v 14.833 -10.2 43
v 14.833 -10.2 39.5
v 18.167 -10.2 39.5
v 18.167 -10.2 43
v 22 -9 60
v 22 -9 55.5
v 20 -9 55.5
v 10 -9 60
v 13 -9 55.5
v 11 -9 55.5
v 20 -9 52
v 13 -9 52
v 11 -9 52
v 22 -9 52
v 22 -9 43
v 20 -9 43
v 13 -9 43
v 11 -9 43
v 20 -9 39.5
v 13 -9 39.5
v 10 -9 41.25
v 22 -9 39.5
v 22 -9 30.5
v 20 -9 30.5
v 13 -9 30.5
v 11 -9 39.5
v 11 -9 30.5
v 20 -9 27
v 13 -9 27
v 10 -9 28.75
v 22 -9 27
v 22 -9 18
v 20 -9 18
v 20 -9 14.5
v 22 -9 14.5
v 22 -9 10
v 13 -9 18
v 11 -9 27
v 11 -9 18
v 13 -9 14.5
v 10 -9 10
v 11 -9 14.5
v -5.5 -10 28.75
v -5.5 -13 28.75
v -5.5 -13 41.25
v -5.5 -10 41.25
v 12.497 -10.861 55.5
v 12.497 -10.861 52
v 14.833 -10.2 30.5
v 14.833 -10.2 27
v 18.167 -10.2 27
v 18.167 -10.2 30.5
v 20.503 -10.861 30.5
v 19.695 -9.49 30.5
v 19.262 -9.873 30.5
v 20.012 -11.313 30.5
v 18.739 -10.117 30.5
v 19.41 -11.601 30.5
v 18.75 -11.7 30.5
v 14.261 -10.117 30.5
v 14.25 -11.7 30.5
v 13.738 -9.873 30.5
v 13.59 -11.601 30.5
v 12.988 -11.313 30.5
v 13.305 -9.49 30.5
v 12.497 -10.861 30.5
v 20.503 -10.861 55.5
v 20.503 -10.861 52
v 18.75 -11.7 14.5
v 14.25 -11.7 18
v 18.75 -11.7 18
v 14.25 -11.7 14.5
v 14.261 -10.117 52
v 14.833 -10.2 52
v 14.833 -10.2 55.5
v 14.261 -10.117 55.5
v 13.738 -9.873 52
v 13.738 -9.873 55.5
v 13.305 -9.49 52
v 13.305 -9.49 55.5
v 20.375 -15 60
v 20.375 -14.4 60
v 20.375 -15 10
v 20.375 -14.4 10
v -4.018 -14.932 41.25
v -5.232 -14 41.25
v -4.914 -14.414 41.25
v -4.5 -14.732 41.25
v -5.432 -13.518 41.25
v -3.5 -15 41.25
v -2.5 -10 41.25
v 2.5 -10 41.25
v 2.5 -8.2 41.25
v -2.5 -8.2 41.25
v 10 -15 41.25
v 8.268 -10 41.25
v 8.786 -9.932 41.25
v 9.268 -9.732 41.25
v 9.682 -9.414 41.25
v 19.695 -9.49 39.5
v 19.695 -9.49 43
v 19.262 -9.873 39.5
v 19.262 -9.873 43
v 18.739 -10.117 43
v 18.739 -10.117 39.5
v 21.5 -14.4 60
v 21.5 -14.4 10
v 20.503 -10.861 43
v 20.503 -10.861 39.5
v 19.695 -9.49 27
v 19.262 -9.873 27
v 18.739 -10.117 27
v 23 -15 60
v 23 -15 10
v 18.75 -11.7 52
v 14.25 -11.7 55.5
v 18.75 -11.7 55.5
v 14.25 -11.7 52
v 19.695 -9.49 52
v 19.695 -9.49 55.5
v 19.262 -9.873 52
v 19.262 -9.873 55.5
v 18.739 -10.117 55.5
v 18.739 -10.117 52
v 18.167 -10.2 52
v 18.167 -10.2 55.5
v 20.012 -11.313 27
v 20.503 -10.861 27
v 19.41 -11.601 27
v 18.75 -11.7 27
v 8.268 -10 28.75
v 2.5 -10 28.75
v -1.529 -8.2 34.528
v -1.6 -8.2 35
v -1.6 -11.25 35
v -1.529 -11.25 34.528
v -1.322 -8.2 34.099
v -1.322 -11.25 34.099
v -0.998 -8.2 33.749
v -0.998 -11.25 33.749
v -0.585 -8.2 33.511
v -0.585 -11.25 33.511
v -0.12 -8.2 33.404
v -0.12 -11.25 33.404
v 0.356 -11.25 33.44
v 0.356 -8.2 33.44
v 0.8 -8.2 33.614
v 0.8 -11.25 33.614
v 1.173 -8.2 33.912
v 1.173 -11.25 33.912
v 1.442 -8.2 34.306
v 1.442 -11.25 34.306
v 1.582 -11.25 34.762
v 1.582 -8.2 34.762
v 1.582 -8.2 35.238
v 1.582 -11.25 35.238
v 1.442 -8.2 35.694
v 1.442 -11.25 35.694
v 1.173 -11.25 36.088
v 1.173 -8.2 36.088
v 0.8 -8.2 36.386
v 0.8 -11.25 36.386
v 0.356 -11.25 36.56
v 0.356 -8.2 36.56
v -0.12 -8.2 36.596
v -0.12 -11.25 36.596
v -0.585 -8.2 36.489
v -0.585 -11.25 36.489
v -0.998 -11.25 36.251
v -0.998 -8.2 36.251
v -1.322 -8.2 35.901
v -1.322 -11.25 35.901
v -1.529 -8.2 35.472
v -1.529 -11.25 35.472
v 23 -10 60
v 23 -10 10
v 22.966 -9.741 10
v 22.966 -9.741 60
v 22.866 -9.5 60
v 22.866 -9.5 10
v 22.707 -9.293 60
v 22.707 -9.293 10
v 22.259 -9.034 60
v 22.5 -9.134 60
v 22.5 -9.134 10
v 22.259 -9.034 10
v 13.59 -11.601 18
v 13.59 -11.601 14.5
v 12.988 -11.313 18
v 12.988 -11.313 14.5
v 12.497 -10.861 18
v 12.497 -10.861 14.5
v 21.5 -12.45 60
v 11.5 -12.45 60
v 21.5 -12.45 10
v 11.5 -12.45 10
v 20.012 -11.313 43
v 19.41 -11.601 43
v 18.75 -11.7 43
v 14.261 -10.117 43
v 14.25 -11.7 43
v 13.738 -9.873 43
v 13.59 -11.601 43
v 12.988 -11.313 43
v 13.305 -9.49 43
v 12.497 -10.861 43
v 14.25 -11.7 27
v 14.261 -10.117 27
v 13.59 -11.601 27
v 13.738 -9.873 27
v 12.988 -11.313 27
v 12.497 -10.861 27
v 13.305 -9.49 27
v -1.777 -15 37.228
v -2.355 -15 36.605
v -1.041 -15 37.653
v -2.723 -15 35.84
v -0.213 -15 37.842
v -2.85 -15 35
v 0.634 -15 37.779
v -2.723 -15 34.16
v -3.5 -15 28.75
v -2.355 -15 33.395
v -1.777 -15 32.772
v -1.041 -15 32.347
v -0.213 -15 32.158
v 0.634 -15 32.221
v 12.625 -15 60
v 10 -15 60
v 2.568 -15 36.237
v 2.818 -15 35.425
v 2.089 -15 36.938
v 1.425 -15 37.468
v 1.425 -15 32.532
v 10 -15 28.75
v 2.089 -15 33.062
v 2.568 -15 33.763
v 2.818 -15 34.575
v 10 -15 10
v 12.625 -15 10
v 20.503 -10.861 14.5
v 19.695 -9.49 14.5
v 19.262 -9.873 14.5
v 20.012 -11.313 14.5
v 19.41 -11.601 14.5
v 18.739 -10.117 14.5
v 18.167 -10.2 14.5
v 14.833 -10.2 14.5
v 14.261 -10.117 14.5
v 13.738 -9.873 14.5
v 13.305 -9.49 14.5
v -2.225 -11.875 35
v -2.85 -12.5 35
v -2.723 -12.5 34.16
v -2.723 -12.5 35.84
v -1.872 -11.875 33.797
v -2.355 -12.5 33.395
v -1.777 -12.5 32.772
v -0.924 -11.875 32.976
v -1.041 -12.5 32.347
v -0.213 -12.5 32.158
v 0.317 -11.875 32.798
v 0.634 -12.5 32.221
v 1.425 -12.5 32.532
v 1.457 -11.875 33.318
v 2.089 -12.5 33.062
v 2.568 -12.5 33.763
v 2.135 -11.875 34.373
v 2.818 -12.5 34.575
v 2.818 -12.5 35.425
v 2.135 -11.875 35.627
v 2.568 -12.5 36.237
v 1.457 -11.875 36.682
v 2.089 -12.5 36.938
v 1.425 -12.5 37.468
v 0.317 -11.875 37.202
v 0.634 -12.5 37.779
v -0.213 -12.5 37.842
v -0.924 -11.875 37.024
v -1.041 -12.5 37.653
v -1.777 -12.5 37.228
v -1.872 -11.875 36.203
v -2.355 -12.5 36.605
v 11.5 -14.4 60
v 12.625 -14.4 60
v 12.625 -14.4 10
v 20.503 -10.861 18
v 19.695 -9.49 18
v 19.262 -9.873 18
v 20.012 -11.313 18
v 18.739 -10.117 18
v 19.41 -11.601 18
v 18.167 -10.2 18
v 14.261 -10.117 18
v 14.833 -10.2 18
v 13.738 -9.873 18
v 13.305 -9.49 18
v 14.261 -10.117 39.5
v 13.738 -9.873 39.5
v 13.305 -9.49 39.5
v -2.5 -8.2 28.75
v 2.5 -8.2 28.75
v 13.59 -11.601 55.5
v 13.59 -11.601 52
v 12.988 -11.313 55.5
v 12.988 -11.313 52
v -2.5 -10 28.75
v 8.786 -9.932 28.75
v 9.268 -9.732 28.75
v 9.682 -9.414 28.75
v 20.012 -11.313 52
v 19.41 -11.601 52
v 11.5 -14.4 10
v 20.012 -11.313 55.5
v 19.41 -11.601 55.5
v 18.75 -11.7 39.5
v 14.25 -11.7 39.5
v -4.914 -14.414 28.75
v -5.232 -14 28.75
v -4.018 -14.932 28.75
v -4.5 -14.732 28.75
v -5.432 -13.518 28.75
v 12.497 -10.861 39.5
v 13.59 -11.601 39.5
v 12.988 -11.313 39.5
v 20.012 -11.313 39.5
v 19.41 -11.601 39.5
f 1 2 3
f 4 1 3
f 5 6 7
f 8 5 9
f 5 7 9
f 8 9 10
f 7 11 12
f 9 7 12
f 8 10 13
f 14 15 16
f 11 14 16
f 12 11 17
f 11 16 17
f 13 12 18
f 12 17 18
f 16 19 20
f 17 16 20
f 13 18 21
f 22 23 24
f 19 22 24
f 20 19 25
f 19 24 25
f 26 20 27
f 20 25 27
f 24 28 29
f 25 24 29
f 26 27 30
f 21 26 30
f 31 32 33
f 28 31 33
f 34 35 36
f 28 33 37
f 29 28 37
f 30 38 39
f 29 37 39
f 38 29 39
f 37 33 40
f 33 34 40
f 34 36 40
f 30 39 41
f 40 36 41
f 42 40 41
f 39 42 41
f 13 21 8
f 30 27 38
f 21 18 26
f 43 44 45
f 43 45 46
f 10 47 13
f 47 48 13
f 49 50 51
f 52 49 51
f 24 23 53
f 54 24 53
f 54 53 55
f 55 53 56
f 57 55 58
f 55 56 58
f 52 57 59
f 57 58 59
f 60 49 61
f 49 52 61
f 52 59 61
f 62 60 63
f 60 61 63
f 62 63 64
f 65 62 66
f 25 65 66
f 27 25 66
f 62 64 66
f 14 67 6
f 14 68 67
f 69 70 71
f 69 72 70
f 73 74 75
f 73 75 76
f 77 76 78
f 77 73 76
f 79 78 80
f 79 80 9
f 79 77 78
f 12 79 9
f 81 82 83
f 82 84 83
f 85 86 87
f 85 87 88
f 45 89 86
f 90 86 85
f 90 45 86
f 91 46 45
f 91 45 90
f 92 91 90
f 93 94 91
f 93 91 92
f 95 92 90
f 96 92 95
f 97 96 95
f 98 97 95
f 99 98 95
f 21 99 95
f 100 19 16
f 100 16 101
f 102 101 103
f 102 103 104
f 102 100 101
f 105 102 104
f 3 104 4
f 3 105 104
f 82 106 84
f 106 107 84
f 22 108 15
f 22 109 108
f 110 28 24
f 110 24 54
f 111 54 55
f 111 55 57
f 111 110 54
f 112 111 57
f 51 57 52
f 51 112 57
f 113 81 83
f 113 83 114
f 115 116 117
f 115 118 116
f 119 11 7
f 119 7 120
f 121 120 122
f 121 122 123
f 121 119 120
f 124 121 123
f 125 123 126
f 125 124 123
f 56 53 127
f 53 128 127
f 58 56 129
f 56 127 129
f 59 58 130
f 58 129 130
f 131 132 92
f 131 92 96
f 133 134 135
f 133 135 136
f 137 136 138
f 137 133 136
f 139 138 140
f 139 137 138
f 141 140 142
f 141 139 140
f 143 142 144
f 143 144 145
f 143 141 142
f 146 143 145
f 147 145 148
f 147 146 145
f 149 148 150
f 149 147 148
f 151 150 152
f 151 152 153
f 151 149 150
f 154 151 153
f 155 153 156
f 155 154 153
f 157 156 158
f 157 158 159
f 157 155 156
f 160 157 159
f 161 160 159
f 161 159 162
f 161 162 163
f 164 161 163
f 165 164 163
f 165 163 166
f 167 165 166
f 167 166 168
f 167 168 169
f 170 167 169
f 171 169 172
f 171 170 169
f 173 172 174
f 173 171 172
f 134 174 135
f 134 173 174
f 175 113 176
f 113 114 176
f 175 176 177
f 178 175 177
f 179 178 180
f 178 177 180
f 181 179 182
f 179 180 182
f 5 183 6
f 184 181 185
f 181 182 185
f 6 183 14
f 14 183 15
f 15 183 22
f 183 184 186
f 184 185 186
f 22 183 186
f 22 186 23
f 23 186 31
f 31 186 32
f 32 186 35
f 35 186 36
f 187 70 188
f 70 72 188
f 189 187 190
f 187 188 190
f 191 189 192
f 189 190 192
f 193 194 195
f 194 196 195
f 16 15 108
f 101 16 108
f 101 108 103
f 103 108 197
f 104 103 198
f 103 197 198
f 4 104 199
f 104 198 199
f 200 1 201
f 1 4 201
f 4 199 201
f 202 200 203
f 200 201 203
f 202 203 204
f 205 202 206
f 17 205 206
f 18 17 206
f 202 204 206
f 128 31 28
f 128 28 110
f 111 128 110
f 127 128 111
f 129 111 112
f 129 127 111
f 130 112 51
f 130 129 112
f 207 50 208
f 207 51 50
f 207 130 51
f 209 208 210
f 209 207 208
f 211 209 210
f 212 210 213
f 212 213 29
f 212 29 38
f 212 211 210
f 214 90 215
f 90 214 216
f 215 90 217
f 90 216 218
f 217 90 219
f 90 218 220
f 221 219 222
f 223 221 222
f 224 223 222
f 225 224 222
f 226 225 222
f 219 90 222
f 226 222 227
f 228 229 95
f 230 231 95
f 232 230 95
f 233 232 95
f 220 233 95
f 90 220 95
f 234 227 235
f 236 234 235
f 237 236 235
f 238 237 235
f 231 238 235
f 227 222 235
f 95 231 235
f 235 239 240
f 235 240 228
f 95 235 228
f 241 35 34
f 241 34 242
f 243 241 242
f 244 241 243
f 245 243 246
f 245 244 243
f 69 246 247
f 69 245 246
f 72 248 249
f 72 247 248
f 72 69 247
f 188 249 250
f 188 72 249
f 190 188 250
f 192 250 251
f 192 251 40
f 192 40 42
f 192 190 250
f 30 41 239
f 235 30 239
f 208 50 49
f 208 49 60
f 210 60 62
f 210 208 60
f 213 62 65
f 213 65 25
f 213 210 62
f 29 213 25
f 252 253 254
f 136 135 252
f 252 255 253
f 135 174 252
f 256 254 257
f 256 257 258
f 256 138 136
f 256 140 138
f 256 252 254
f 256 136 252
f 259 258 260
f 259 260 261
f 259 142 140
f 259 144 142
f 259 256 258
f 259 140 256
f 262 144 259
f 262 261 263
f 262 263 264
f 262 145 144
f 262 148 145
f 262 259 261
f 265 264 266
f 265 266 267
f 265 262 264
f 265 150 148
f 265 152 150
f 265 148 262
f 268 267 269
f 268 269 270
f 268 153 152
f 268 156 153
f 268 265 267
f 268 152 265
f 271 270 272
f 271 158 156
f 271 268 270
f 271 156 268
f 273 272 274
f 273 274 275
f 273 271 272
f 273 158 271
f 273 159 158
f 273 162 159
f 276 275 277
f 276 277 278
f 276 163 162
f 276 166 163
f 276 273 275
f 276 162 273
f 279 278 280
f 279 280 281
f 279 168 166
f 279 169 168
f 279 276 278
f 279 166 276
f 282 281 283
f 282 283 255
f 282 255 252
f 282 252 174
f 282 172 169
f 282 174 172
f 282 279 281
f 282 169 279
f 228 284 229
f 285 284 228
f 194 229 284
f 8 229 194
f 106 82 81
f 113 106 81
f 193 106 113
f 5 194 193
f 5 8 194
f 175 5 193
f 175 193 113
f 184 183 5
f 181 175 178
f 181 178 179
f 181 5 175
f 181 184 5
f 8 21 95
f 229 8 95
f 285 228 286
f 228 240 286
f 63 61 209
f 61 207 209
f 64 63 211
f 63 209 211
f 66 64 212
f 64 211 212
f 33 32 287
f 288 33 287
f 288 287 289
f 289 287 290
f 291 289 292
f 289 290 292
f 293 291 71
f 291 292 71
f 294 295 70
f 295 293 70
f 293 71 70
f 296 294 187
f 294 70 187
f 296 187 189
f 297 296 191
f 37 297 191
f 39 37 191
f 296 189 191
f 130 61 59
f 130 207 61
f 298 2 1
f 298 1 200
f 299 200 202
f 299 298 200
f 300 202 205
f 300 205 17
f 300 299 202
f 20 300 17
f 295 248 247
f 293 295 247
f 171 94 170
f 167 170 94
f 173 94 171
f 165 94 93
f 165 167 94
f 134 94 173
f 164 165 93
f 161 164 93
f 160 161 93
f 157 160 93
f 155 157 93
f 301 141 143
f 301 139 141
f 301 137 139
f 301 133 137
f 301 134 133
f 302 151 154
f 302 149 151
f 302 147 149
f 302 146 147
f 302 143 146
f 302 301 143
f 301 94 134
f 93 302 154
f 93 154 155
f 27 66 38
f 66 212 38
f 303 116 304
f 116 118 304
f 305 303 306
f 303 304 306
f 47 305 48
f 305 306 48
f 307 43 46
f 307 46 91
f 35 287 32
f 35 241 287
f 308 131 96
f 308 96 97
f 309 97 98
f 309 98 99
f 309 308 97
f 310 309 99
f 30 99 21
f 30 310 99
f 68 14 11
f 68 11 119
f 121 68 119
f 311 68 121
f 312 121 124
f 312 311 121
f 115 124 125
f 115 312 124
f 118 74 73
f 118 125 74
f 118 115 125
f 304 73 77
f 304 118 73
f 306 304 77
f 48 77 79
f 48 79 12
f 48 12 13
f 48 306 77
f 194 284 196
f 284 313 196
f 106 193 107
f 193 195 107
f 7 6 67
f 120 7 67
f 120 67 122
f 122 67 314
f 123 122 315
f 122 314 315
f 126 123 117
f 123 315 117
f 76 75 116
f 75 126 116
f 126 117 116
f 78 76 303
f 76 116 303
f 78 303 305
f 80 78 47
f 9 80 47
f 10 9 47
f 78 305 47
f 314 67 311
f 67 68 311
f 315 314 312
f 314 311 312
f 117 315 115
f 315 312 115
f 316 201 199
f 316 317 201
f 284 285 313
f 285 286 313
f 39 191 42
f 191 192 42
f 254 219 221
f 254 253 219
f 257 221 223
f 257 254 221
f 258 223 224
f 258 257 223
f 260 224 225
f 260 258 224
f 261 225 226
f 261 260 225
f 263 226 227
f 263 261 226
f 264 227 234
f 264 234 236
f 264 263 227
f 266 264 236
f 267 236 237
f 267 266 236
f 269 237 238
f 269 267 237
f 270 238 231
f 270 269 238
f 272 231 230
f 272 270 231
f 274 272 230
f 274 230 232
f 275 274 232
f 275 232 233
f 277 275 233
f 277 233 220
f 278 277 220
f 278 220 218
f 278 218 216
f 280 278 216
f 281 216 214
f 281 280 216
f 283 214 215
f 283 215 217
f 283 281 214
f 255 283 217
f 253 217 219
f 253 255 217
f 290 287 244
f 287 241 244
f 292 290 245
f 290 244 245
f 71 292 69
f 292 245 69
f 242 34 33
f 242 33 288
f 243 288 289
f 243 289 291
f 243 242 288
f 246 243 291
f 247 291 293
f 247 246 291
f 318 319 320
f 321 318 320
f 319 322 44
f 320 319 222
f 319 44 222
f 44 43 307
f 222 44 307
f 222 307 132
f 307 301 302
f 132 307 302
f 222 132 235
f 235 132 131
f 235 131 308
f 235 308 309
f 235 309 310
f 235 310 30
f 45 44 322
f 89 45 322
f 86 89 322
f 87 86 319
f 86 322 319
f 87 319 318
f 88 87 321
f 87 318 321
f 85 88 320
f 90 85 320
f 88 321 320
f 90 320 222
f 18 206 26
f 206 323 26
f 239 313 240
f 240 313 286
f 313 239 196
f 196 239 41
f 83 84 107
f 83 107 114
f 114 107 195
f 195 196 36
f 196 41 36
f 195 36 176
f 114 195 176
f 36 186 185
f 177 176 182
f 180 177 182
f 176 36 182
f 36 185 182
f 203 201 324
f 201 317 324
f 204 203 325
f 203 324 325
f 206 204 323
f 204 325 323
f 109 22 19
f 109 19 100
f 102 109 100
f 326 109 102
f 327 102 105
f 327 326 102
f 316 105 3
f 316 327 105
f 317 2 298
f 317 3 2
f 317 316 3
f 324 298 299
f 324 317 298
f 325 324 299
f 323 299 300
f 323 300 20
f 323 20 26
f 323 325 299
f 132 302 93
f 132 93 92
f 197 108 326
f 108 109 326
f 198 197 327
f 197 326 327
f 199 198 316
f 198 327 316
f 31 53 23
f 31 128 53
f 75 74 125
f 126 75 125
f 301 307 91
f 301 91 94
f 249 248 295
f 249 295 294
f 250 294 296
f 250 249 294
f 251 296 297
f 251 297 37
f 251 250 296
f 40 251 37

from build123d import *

# Parameters (mm, degrees)
PAD009_DEPTH    = 12.5
POCKET001_DEPTH = 1.75
PAD013_DEPTH    = 12.5


with BuildPart() as f_12_5mm_segment:
    # Sketch015 → Pad009 (new body)
    with BuildSketch(Plane.XY):
        with BuildLine():
            Line((10, -9), (10, -15))
            Line((10, -15), (12.625, -15))
            Line((12.625, -15), (12.625, -14.4))
            Line((12.625, -14.4), (11.5, -14.4))
            Line((11.5, -14.4), (11.5, -12.45))
            Line((11.5, -12.45), (21.5, -12.45))
            Line((21.5, -12.45), (21.5, -14.4))
            Line((21.5, -14.4), (20.375, -14.4))
            Line((20.375, -14.4), (20.375, -15))
            Line((20.375, -15), (23, -15))
            Line((23, -15), (23, -10))
            ThreePointArc((23, -10), (22.707107, -9.292893), (22, -9))
            Line((22, -9), (10, -9))
        make_face()
    extrude(amount=PAD009_DEPTH)

    # Sketch016 → Pocket001 (cut, symmetric)
    with BuildSketch(Plane(origin=(0, 0, 6.25), x_dir=(1, 0, 0), z_dir=(0, 0, -1))):
        with BuildLine():
            ThreePointArc((14.83303, 10.2), (13.737585, 9.87332), (13, 9))
            Line((11, 9), (13, 9))
            Line((12.497007, 10.860502), (11, 9))
            ThreePointArc((14.25, 11.7), (13.27818, 11.479302), (12.497007, 10.860502))
            Line((14.25, 11.7), (18.75, 11.7))
            ThreePointArc((20.502993, 10.860502), (19.72182, 11.479302), (18.75, 11.7))
            Line((20.502993, 10.860502), (22, 9))
            Line((22, 9), (20, 9))
            ThreePointArc((20, 9), (19.262415, 9.87332), (18.16697, 10.2))
            Line((14.83303, 10.2), (18.16697, 10.2))
        make_face()
    extrude(amount=POCKET001_DEPTH, both=True, mode=Mode.SUBTRACT)


with BuildPart() as sf_seg1:
    # Body019 base: copy of 12.5mm-Segment
    add(f_12_5mm_segment.part)


with BuildPart() as sf_seg2:
    # Body022 base: copy of SF-Seg1
    add(sf_seg1.part)


with BuildPart() as sf_seg2_1:
    # Body022 placement: moved
    add(sf_seg2.part.moved(Location((0, 0, 12.5))))


with BuildPart() as sf_seg3:
    # Body012004 base: copy of 12.5mm-Segment
    add(f_12_5mm_segment.part)


with BuildPart() as sf_seg3_1:
    # Body012004 placement: moved
    add(sf_seg3.part.moved(Location((0, 0, 25))))


with BuildPart() as sf_seg4:
    # Body012005 base: copy of 12.5mm-Segment
    add(f_12_5mm_segment.part)


with BuildPart() as sf_seg4_1:
    # Body012005 placement: moved
    add(sf_seg4.part.moved(Location((0, 0, 37.5))))


with BuildPart() as f_50mm_screwfix:
    # Sketch027 → Pad013 (new body)
    with BuildSketch(Plane.XY):
        with BuildLine():
            Line((-3.5, -15), (10, -15))
            Line((10, -9), (10, -15))
            ThreePointArc((8.267949, -10), (9.267949, -9.732051), (10, -9))
            Line((2.5, -10), (8.267949, -10))
            Line((2.5, -8.2), (2.5, -10))
            Line((-2.5, -8.2), (2.5, -8.2))
            Line((-2.5, -10), (-2.5, -8.2))
            Line((-5.5, -10), (-2.5, -10))
            Line((-5.5, -13), (-5.5, -10))
            ThreePointArc((-5.5, -13), (-4.914214, -14.414214), (-3.5, -15))
        make_face()
    extrude(amount=PAD013_DEPTH)

    # Sketch028 → Groove (revolve, cut)
    with BuildSketch(Plane(origin=(0, -11, 6.25), x_dir=(-1, 0, 0), z_dir=(0, 0, 1))):
        Polygon((0, 4), (2.85, 4), (2.85, 1.5), (1.6, 0.25), (1.6, -7.75), (0, -7.75), align=None)
    revolve(axis=Axis((0, -11, 6.25), (0, -1, 0)), mode=Mode.SUBTRACT)


with BuildPart() as f_50mm_screwfix_1:
    # Body018 placement: moved
    add(f_50mm_screwfix.part.moved(Location((0, 0, 18.75))))

    # Fusion: union SF-Seg1, SF-Seg2, SF-Seg3, SF-Seg4
    add(sf_seg1.part)
    add(sf_seg2_1.part)
    add(sf_seg3_1.part)
    add(sf_seg4_1.part)


with BuildPart() as f_50mm_screwfix_2:
    # Fusion placement: moved
    add(f_50mm_screwfix_1.part.moved(Location((0, 0, 10))))


solid = f_50mm_screwfix_2.part
